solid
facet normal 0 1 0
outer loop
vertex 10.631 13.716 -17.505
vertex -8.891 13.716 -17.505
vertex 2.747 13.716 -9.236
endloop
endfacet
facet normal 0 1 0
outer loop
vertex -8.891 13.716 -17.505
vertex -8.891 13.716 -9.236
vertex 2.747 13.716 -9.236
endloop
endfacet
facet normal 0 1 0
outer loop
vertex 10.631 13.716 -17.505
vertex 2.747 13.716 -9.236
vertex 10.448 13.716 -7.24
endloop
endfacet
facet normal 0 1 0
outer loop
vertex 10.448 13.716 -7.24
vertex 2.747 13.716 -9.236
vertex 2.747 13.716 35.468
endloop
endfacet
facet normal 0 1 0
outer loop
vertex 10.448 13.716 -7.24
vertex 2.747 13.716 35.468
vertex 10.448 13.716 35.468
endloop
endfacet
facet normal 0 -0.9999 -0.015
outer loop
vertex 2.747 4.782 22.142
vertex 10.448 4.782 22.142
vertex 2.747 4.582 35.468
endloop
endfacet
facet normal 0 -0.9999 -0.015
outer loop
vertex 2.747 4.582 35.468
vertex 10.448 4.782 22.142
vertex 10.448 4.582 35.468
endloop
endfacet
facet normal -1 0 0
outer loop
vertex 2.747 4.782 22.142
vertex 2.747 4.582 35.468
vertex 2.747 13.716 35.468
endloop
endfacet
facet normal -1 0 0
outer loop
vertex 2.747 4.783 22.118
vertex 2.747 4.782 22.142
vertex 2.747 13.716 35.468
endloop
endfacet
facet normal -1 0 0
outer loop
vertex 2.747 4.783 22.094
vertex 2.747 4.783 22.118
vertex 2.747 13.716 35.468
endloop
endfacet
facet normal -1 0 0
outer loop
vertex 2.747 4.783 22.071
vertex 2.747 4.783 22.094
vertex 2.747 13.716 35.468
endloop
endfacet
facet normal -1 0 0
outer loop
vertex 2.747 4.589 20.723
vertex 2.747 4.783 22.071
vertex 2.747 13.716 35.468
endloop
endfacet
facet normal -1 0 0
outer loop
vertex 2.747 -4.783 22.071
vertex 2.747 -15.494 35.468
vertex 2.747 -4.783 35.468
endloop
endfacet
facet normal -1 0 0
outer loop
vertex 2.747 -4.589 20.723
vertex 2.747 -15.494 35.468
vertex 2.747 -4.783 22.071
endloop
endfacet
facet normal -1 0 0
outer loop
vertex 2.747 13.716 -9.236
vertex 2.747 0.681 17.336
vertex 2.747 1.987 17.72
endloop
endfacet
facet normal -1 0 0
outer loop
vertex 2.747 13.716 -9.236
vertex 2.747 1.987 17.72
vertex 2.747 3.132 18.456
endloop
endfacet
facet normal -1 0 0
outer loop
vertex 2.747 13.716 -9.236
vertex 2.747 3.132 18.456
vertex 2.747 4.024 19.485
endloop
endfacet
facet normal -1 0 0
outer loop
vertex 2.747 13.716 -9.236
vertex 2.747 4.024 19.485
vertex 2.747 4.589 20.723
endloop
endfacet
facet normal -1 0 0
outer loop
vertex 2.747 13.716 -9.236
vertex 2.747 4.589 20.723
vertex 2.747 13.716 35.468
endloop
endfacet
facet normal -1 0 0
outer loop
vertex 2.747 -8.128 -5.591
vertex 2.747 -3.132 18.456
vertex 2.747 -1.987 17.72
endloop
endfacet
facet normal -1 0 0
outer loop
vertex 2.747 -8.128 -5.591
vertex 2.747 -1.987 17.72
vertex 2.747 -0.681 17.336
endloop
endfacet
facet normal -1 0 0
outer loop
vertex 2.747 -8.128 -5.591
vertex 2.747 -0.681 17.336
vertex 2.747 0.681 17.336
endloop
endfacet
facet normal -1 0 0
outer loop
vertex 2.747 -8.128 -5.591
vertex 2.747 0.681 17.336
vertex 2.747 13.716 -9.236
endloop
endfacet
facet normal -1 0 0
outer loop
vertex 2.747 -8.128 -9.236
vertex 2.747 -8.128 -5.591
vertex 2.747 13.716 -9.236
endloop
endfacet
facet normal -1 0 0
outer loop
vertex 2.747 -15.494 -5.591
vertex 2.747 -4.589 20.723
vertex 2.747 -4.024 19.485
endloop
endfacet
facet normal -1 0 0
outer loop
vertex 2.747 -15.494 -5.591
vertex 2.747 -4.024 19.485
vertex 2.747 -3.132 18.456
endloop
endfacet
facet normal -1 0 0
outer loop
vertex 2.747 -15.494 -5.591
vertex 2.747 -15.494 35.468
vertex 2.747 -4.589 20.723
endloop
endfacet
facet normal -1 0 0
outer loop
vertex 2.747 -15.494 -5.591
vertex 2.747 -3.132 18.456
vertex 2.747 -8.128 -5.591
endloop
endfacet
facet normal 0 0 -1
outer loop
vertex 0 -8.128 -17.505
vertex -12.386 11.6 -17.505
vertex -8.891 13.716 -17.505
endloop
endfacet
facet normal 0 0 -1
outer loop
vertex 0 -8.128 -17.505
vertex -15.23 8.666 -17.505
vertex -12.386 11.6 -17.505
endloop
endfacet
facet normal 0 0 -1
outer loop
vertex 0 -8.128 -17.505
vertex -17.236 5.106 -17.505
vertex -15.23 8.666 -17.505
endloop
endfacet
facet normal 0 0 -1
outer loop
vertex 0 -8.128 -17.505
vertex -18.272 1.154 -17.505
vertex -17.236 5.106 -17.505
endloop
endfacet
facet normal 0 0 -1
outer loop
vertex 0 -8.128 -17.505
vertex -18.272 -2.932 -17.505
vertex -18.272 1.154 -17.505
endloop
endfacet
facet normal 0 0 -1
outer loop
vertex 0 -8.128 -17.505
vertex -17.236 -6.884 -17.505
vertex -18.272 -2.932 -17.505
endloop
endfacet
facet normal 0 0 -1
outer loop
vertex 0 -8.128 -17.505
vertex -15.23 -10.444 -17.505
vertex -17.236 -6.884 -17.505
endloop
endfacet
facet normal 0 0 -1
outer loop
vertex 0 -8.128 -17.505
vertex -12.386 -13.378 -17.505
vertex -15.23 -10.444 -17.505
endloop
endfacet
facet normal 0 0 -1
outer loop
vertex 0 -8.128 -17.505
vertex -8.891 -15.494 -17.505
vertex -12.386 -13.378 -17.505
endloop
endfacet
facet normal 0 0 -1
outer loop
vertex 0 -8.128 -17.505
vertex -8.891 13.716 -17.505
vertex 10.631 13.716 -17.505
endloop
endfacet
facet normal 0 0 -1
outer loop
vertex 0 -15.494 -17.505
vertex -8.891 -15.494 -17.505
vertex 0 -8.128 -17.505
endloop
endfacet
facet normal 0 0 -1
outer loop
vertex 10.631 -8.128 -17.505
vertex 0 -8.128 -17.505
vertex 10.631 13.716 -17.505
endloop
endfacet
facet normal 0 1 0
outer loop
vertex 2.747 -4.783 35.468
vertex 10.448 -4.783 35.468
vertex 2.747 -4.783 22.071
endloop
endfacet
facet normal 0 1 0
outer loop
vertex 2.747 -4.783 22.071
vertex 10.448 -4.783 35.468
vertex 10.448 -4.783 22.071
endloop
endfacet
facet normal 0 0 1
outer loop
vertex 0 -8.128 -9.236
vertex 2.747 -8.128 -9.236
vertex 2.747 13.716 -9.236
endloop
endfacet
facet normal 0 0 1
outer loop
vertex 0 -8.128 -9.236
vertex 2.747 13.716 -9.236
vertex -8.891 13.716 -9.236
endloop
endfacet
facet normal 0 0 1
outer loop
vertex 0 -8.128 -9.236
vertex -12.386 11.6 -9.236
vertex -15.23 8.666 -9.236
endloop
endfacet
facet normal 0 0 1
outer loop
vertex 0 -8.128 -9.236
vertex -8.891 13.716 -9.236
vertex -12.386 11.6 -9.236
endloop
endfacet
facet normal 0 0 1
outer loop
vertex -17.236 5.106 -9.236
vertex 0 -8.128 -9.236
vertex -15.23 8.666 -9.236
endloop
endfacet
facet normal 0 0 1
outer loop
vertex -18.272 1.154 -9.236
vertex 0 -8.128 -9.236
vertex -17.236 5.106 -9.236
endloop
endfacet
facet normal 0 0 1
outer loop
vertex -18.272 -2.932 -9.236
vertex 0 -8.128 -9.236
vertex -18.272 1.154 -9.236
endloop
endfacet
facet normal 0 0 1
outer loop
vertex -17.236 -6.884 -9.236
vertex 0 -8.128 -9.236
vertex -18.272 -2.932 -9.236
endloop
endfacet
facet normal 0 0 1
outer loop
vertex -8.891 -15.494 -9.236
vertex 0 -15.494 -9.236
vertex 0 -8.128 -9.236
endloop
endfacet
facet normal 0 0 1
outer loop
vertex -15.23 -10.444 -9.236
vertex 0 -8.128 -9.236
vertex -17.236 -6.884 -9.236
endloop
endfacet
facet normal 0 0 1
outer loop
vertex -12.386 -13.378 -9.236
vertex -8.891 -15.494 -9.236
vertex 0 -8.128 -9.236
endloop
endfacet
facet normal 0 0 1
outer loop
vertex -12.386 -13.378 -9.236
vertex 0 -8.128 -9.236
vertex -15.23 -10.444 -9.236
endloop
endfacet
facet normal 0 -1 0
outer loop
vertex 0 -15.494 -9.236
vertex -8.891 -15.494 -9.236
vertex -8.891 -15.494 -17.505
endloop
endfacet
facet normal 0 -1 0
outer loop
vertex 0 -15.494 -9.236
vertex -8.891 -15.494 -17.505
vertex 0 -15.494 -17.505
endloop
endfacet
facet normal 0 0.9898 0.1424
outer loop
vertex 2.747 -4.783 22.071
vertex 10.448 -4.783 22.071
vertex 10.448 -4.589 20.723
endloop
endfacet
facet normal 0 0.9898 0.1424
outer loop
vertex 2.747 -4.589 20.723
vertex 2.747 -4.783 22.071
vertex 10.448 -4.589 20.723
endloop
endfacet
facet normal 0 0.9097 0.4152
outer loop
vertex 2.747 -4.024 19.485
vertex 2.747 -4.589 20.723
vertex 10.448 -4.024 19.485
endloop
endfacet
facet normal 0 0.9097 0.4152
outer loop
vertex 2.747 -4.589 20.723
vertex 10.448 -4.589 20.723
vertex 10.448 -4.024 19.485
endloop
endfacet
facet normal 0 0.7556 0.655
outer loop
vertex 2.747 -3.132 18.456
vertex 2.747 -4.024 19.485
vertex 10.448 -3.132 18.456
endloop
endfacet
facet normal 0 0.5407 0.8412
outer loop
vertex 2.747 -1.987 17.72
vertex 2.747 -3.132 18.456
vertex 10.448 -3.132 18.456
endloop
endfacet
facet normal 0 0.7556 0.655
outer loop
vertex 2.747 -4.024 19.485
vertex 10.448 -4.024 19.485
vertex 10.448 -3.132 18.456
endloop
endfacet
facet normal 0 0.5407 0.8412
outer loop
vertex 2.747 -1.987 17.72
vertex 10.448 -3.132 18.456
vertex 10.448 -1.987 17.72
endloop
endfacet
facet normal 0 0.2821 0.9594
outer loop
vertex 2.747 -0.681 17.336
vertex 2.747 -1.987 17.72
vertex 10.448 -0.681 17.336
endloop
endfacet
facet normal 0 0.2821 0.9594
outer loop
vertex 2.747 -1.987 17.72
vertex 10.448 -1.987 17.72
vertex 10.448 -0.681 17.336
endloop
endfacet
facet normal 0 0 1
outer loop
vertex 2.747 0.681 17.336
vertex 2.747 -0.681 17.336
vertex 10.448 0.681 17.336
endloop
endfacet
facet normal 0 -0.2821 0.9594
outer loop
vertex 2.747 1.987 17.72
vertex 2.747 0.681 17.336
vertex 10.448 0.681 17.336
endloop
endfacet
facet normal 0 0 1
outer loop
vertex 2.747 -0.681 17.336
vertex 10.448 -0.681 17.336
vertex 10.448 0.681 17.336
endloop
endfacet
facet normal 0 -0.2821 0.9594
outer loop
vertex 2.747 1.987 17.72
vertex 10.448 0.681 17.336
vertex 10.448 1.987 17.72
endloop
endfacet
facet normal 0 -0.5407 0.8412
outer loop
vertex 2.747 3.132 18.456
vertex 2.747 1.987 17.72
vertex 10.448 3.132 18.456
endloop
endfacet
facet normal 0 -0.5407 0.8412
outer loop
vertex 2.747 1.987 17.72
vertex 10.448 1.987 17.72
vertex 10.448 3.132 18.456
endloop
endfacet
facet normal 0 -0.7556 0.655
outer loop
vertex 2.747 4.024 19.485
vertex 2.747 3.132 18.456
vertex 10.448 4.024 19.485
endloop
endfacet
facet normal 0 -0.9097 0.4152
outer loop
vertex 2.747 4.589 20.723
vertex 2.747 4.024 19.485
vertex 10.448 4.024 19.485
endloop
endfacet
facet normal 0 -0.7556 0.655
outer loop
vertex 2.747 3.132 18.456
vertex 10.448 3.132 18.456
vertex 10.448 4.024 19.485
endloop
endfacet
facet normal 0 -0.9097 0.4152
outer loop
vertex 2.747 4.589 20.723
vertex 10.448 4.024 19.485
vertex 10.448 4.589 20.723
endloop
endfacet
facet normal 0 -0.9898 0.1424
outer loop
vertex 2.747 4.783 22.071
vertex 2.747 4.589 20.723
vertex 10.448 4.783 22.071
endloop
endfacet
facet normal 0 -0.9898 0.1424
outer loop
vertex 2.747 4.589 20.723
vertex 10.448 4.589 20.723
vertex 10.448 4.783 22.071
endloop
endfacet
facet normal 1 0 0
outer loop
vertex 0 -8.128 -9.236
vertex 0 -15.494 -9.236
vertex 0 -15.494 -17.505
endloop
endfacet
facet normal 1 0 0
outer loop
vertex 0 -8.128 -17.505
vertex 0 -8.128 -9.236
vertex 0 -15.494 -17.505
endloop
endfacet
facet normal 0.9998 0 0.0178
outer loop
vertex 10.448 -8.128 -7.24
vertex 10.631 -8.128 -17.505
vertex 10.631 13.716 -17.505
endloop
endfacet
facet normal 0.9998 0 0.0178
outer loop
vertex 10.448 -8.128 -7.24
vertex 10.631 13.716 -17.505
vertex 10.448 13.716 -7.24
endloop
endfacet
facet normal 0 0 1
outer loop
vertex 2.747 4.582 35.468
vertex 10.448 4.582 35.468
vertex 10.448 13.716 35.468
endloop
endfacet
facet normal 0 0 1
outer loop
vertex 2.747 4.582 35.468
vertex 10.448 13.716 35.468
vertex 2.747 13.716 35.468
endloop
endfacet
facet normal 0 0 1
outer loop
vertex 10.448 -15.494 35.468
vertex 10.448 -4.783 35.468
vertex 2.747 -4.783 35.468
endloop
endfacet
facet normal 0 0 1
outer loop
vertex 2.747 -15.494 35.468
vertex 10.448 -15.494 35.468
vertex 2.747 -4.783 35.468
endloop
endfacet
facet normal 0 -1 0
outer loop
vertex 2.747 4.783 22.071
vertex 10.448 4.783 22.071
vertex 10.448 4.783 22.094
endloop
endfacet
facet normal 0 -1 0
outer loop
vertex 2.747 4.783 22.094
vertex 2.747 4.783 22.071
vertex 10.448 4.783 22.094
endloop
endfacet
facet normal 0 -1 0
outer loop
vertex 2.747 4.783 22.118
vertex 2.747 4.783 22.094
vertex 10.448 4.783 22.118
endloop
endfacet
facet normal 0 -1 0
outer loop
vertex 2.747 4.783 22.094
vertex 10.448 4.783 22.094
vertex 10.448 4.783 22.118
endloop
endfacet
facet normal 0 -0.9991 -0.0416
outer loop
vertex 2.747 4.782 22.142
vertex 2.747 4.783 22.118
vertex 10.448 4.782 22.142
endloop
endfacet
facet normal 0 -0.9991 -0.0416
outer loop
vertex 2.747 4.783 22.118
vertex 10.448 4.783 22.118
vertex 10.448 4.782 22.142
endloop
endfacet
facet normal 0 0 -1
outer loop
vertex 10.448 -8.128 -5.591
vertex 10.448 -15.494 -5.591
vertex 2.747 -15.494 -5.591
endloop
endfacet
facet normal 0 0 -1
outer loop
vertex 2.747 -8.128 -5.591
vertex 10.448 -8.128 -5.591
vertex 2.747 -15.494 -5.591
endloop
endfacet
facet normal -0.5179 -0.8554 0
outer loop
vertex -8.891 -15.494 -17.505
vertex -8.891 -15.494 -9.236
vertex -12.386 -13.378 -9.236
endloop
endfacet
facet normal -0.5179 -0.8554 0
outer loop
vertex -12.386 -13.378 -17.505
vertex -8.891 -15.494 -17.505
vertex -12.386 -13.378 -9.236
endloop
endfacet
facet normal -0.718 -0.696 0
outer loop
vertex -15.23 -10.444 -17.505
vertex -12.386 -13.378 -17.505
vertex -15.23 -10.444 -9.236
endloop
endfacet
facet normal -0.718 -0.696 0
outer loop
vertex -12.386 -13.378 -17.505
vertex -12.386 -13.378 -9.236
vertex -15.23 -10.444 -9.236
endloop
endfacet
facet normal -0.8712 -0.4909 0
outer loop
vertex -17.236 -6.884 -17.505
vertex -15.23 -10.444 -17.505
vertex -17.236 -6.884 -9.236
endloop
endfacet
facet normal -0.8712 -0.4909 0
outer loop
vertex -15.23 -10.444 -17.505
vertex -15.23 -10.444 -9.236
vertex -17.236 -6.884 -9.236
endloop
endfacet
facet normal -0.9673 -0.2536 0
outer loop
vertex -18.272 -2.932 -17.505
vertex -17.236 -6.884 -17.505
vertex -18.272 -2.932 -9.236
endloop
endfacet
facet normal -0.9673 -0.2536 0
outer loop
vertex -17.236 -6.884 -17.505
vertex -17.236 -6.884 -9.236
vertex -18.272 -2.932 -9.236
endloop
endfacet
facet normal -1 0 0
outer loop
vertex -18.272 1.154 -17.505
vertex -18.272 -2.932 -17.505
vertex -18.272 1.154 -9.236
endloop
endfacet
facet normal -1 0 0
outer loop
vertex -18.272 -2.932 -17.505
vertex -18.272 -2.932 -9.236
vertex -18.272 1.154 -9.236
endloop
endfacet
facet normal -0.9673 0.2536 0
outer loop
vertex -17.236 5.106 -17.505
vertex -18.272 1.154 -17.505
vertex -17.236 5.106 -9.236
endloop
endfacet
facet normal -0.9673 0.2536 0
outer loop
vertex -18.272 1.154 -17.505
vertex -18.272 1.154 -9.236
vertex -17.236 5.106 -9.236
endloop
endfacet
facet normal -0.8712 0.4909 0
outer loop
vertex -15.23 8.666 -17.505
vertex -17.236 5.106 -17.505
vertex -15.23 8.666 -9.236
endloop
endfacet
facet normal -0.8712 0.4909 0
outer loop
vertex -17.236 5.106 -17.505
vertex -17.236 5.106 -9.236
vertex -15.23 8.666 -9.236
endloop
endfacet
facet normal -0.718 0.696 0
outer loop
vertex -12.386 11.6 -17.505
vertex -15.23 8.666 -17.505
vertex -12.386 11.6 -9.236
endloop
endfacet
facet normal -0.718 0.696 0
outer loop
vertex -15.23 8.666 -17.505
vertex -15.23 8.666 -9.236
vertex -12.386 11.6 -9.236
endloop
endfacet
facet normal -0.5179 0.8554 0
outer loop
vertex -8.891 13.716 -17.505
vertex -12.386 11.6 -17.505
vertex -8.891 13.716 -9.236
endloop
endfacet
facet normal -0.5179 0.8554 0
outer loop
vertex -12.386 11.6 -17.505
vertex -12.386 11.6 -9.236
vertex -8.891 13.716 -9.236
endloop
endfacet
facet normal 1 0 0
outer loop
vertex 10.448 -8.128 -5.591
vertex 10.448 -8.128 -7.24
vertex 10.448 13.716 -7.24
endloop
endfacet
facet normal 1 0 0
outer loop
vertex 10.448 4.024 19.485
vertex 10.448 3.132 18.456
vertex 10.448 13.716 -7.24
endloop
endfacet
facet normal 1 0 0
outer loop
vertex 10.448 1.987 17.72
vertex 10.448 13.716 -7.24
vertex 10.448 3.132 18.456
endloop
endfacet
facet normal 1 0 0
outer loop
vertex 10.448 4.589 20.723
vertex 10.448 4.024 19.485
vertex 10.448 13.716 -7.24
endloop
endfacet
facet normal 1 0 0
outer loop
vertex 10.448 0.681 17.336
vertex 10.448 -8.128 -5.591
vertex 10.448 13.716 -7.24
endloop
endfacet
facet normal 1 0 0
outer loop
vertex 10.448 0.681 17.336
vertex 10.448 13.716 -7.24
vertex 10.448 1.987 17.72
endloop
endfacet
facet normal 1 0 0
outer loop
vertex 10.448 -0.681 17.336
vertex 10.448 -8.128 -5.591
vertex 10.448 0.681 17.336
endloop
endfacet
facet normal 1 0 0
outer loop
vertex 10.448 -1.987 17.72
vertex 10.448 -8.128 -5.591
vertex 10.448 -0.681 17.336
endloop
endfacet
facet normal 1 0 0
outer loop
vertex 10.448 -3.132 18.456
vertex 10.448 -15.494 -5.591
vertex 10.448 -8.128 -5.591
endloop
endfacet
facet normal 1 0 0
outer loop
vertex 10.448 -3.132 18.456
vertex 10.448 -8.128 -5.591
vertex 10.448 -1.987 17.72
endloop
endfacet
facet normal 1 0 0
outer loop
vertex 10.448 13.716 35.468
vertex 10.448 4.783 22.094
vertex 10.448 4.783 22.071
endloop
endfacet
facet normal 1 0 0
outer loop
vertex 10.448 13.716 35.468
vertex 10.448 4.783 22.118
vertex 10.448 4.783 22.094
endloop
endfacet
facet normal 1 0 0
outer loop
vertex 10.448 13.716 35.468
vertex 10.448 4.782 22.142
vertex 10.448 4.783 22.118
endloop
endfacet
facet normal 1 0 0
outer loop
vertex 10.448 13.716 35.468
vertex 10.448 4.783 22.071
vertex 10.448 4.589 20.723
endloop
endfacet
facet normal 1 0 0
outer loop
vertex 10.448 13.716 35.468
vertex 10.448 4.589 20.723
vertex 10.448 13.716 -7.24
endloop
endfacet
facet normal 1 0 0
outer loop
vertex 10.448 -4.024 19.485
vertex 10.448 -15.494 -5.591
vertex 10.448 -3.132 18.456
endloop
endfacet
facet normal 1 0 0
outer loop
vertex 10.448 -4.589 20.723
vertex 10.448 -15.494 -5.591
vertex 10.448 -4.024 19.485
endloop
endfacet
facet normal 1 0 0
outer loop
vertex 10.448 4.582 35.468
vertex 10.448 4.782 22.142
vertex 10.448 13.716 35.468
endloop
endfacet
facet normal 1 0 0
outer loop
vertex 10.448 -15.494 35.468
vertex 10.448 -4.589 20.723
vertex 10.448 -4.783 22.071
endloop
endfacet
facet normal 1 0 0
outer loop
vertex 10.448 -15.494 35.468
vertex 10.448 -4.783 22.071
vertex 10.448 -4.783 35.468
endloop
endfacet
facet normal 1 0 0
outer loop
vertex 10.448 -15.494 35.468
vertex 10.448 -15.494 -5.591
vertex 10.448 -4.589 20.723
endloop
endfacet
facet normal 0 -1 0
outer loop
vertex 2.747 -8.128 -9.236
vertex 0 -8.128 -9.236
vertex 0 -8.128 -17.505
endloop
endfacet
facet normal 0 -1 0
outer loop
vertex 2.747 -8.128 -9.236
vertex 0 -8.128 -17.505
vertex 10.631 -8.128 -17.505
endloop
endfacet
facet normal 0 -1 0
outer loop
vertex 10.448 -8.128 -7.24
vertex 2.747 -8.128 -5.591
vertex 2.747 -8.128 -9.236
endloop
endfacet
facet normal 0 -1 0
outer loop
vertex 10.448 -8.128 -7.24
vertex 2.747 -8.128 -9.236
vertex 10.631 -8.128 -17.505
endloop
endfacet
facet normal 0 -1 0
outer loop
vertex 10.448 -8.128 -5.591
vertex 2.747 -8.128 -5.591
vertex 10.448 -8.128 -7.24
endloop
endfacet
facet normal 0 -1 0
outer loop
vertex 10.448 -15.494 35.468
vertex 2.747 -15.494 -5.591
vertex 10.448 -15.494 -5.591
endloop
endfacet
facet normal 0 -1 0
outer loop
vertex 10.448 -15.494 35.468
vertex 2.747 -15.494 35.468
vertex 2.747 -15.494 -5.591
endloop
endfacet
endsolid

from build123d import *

# Parameters (mm, degrees)
F1_DEPTH      = 15.494
F1_DEPTH_BACK = 13.716
F3_DEPTH      = 25.4
F5_DEPTH      = 25.4
F7_DEPTH      = 7.366


with BuildPart() as f1:
    # F0 (on Front) → F1 (new body, two sides)
    with BuildSketch(Plane.XZ) as f1_sk:
        Polygon((10.631341, -17.505052), (10.44804, -7.240309), (10.44804, 35.468351), (2.74667, 35.468351), (2.74667, -9.236218), (-20.529484, -9.236218), (-20.529484, -17.505052), align=None)
    extrude(amount=F1_DEPTH)
    extrude(f1_sk.sketch, amount=-F1_DEPTH_BACK)

    # F2 (on face) → F3 (cut)
    with BuildSketch(Plane.YZ.offset(10.44804)):
        with BuildLine():
            ThreePointArc((4.782288, 22.142286), (-0.035854, 26.85327), (-4.782825, 22.070579))
            ThreePointArc((-4.782825, 22.070579), (0, 17.287754), (4.782825, 22.070579))
            ThreePointArc((4.782825, 22.070579), (4.782691, 22.106434), (4.782288, 22.142286))
        make_face()
        with BuildLine():
            Line((-4.782825, 35.468351), (-4.782825, 22.070579))
            ThreePointArc((-4.782825, 22.070579), (-0.035854, 26.85327), (4.782288, 22.142286))
            Line((4.782288, 22.142286), (4.582474, 35.468351))
            Line((4.582474, 35.468351), (-4.782825, 35.468351))
        make_face()
    extrude(amount=-F3_DEPTH, mode=Mode.SUBTRACT)

    # F4 (on face) → F5 (cut)
    with BuildSketch(Plane.XY.offset(-9.236218)):
        with BuildLine():
            ThreePointArc((-8.891407, -15.494), (-18.403713, -0.889), (-8.891407, 13.716))
            Line((-8.891407, 13.716), (-20.529484, 13.716))
            Line((-20.529484, 13.716), (-20.529484, -15.494))
            Line((-20.529484, -15.494), (-8.891407, -15.494))
        make_face()
    extrude(amount=-F5_DEPTH, mode=Mode.SUBTRACT)

    # F6 (on face) → F7 (cut)
    with BuildSketch(Plane.XZ.offset(15.494)):
        Polygon((10.44804, -5.590619), (2.74667, -5.590619), (2.74667, -9.236218), (0, -9.236218), (0, -17.505052), (10.631341, -17.505052), (10.44804, -7.240309), align=None)
    extrude(amount=-F7_DEPTH, mode=Mode.SUBTRACT)


solid = f1.part
